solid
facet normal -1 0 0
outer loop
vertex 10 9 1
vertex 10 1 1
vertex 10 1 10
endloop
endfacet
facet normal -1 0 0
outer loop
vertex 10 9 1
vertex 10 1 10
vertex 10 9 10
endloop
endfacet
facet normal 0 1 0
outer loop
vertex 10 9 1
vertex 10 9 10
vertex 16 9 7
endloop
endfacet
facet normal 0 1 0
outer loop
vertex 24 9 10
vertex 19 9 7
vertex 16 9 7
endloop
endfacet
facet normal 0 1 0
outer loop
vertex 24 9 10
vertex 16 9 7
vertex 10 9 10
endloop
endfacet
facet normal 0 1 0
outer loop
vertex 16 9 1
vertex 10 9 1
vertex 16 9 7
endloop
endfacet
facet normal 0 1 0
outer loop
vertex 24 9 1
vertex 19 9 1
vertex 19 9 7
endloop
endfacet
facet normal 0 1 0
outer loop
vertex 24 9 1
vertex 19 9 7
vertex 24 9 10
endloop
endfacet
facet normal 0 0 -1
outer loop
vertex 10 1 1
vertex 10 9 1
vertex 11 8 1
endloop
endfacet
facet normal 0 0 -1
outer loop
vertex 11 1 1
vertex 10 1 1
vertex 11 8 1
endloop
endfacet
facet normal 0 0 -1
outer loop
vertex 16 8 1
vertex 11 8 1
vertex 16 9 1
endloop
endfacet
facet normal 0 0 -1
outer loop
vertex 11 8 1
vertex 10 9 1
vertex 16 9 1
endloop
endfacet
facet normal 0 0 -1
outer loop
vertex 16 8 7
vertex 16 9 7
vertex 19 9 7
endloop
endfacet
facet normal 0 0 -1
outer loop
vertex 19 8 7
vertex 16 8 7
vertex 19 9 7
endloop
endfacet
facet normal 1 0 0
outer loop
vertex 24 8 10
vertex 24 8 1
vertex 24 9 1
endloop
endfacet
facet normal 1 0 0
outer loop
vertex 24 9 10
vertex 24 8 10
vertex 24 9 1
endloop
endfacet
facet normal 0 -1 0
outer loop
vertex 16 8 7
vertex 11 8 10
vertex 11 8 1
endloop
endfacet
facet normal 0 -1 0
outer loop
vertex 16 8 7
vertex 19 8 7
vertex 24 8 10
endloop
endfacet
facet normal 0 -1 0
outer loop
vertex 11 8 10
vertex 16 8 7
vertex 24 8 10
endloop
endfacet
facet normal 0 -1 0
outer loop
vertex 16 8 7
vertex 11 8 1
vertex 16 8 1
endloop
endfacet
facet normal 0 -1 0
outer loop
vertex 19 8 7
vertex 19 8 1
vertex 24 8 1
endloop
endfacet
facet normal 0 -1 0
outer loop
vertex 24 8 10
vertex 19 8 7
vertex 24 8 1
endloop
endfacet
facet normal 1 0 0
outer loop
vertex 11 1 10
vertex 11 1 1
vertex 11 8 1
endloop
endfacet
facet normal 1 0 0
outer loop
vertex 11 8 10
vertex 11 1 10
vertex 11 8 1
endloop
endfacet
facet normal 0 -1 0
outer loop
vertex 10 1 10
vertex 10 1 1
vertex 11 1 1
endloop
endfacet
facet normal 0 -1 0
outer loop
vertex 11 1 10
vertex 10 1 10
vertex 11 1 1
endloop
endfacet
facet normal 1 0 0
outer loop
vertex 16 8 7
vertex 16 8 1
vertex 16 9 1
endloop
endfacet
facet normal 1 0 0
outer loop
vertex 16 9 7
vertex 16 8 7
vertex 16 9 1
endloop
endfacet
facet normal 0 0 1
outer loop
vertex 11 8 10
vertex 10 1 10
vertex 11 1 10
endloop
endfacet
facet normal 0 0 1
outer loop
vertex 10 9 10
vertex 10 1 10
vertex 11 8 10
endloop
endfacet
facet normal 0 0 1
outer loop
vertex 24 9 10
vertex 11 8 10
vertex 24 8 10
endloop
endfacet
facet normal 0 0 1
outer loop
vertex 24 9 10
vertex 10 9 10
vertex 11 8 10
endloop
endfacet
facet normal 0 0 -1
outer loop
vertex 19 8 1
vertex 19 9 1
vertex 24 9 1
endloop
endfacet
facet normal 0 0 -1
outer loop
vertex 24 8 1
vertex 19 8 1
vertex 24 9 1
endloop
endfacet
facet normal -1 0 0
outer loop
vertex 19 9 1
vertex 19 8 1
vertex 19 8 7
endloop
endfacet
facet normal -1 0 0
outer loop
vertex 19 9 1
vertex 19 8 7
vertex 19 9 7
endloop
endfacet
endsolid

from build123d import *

# Parameters (mm, degrees)
BOX018_W     = 5
BOX018_H     = 1
BOX018_DEPTH = 9
BOX017_W     = 5
BOX017_H     = 1
BOX017_DEPTH = 9
BOX019_W     = 3
BOX019_H     = 1
BOX019_DEPTH = 3
BOX007_W     = 1
BOX007_H     = 8
BOX007_DEPTH = 9


with BuildPart() as box018:
    # Box018 → Box018 (new body)
    with BuildSketch(Plane(origin=(19, 8, 1), x_dir=(1, 0, 0), z_dir=(0, 0, 1))):
        with Locations((2.5, 0.5)):
            Rectangle(BOX018_W, BOX018_H)
    extrude(amount=BOX018_DEPTH)


with BuildPart() as box017:
    # Box017 → Box017 (new body)
    with BuildSketch(Plane(origin=(11, 8, 1), x_dir=(1, 0, 0), z_dir=(0, 0, 1))):
        with Locations((2.5, 0.5)):
            Rectangle(BOX017_W, BOX017_H)
    extrude(amount=BOX017_DEPTH)


with BuildPart() as fusion007:
    # Box019 → Box019 (new body)
    with BuildSketch(Plane(origin=(16, 8, 7), x_dir=(1, 0, 0), z_dir=(0, 0, 1))):
        with Locations((1.5, 0.5)):
            Rectangle(BOX019_W, BOX019_H)
    extrude(amount=BOX019_DEPTH)

    # Fusion007: union Box018, Box017
    add(box018.part)
    add(box017.part)


with BuildPart() as fusion040:
    # Box007 → Box007 (new body)
    with BuildSketch(Plane(origin=(10, 1, 1), x_dir=(1, 0, 0), z_dir=(0, 0, 1))):
        with Locations((0.5, 4)):
            Rectangle(BOX007_W, BOX007_H)
    extrude(amount=BOX007_DEPTH)

    # Fusion040: union Fusion007
    add(fusion007.part)


solid = fusion040.part
